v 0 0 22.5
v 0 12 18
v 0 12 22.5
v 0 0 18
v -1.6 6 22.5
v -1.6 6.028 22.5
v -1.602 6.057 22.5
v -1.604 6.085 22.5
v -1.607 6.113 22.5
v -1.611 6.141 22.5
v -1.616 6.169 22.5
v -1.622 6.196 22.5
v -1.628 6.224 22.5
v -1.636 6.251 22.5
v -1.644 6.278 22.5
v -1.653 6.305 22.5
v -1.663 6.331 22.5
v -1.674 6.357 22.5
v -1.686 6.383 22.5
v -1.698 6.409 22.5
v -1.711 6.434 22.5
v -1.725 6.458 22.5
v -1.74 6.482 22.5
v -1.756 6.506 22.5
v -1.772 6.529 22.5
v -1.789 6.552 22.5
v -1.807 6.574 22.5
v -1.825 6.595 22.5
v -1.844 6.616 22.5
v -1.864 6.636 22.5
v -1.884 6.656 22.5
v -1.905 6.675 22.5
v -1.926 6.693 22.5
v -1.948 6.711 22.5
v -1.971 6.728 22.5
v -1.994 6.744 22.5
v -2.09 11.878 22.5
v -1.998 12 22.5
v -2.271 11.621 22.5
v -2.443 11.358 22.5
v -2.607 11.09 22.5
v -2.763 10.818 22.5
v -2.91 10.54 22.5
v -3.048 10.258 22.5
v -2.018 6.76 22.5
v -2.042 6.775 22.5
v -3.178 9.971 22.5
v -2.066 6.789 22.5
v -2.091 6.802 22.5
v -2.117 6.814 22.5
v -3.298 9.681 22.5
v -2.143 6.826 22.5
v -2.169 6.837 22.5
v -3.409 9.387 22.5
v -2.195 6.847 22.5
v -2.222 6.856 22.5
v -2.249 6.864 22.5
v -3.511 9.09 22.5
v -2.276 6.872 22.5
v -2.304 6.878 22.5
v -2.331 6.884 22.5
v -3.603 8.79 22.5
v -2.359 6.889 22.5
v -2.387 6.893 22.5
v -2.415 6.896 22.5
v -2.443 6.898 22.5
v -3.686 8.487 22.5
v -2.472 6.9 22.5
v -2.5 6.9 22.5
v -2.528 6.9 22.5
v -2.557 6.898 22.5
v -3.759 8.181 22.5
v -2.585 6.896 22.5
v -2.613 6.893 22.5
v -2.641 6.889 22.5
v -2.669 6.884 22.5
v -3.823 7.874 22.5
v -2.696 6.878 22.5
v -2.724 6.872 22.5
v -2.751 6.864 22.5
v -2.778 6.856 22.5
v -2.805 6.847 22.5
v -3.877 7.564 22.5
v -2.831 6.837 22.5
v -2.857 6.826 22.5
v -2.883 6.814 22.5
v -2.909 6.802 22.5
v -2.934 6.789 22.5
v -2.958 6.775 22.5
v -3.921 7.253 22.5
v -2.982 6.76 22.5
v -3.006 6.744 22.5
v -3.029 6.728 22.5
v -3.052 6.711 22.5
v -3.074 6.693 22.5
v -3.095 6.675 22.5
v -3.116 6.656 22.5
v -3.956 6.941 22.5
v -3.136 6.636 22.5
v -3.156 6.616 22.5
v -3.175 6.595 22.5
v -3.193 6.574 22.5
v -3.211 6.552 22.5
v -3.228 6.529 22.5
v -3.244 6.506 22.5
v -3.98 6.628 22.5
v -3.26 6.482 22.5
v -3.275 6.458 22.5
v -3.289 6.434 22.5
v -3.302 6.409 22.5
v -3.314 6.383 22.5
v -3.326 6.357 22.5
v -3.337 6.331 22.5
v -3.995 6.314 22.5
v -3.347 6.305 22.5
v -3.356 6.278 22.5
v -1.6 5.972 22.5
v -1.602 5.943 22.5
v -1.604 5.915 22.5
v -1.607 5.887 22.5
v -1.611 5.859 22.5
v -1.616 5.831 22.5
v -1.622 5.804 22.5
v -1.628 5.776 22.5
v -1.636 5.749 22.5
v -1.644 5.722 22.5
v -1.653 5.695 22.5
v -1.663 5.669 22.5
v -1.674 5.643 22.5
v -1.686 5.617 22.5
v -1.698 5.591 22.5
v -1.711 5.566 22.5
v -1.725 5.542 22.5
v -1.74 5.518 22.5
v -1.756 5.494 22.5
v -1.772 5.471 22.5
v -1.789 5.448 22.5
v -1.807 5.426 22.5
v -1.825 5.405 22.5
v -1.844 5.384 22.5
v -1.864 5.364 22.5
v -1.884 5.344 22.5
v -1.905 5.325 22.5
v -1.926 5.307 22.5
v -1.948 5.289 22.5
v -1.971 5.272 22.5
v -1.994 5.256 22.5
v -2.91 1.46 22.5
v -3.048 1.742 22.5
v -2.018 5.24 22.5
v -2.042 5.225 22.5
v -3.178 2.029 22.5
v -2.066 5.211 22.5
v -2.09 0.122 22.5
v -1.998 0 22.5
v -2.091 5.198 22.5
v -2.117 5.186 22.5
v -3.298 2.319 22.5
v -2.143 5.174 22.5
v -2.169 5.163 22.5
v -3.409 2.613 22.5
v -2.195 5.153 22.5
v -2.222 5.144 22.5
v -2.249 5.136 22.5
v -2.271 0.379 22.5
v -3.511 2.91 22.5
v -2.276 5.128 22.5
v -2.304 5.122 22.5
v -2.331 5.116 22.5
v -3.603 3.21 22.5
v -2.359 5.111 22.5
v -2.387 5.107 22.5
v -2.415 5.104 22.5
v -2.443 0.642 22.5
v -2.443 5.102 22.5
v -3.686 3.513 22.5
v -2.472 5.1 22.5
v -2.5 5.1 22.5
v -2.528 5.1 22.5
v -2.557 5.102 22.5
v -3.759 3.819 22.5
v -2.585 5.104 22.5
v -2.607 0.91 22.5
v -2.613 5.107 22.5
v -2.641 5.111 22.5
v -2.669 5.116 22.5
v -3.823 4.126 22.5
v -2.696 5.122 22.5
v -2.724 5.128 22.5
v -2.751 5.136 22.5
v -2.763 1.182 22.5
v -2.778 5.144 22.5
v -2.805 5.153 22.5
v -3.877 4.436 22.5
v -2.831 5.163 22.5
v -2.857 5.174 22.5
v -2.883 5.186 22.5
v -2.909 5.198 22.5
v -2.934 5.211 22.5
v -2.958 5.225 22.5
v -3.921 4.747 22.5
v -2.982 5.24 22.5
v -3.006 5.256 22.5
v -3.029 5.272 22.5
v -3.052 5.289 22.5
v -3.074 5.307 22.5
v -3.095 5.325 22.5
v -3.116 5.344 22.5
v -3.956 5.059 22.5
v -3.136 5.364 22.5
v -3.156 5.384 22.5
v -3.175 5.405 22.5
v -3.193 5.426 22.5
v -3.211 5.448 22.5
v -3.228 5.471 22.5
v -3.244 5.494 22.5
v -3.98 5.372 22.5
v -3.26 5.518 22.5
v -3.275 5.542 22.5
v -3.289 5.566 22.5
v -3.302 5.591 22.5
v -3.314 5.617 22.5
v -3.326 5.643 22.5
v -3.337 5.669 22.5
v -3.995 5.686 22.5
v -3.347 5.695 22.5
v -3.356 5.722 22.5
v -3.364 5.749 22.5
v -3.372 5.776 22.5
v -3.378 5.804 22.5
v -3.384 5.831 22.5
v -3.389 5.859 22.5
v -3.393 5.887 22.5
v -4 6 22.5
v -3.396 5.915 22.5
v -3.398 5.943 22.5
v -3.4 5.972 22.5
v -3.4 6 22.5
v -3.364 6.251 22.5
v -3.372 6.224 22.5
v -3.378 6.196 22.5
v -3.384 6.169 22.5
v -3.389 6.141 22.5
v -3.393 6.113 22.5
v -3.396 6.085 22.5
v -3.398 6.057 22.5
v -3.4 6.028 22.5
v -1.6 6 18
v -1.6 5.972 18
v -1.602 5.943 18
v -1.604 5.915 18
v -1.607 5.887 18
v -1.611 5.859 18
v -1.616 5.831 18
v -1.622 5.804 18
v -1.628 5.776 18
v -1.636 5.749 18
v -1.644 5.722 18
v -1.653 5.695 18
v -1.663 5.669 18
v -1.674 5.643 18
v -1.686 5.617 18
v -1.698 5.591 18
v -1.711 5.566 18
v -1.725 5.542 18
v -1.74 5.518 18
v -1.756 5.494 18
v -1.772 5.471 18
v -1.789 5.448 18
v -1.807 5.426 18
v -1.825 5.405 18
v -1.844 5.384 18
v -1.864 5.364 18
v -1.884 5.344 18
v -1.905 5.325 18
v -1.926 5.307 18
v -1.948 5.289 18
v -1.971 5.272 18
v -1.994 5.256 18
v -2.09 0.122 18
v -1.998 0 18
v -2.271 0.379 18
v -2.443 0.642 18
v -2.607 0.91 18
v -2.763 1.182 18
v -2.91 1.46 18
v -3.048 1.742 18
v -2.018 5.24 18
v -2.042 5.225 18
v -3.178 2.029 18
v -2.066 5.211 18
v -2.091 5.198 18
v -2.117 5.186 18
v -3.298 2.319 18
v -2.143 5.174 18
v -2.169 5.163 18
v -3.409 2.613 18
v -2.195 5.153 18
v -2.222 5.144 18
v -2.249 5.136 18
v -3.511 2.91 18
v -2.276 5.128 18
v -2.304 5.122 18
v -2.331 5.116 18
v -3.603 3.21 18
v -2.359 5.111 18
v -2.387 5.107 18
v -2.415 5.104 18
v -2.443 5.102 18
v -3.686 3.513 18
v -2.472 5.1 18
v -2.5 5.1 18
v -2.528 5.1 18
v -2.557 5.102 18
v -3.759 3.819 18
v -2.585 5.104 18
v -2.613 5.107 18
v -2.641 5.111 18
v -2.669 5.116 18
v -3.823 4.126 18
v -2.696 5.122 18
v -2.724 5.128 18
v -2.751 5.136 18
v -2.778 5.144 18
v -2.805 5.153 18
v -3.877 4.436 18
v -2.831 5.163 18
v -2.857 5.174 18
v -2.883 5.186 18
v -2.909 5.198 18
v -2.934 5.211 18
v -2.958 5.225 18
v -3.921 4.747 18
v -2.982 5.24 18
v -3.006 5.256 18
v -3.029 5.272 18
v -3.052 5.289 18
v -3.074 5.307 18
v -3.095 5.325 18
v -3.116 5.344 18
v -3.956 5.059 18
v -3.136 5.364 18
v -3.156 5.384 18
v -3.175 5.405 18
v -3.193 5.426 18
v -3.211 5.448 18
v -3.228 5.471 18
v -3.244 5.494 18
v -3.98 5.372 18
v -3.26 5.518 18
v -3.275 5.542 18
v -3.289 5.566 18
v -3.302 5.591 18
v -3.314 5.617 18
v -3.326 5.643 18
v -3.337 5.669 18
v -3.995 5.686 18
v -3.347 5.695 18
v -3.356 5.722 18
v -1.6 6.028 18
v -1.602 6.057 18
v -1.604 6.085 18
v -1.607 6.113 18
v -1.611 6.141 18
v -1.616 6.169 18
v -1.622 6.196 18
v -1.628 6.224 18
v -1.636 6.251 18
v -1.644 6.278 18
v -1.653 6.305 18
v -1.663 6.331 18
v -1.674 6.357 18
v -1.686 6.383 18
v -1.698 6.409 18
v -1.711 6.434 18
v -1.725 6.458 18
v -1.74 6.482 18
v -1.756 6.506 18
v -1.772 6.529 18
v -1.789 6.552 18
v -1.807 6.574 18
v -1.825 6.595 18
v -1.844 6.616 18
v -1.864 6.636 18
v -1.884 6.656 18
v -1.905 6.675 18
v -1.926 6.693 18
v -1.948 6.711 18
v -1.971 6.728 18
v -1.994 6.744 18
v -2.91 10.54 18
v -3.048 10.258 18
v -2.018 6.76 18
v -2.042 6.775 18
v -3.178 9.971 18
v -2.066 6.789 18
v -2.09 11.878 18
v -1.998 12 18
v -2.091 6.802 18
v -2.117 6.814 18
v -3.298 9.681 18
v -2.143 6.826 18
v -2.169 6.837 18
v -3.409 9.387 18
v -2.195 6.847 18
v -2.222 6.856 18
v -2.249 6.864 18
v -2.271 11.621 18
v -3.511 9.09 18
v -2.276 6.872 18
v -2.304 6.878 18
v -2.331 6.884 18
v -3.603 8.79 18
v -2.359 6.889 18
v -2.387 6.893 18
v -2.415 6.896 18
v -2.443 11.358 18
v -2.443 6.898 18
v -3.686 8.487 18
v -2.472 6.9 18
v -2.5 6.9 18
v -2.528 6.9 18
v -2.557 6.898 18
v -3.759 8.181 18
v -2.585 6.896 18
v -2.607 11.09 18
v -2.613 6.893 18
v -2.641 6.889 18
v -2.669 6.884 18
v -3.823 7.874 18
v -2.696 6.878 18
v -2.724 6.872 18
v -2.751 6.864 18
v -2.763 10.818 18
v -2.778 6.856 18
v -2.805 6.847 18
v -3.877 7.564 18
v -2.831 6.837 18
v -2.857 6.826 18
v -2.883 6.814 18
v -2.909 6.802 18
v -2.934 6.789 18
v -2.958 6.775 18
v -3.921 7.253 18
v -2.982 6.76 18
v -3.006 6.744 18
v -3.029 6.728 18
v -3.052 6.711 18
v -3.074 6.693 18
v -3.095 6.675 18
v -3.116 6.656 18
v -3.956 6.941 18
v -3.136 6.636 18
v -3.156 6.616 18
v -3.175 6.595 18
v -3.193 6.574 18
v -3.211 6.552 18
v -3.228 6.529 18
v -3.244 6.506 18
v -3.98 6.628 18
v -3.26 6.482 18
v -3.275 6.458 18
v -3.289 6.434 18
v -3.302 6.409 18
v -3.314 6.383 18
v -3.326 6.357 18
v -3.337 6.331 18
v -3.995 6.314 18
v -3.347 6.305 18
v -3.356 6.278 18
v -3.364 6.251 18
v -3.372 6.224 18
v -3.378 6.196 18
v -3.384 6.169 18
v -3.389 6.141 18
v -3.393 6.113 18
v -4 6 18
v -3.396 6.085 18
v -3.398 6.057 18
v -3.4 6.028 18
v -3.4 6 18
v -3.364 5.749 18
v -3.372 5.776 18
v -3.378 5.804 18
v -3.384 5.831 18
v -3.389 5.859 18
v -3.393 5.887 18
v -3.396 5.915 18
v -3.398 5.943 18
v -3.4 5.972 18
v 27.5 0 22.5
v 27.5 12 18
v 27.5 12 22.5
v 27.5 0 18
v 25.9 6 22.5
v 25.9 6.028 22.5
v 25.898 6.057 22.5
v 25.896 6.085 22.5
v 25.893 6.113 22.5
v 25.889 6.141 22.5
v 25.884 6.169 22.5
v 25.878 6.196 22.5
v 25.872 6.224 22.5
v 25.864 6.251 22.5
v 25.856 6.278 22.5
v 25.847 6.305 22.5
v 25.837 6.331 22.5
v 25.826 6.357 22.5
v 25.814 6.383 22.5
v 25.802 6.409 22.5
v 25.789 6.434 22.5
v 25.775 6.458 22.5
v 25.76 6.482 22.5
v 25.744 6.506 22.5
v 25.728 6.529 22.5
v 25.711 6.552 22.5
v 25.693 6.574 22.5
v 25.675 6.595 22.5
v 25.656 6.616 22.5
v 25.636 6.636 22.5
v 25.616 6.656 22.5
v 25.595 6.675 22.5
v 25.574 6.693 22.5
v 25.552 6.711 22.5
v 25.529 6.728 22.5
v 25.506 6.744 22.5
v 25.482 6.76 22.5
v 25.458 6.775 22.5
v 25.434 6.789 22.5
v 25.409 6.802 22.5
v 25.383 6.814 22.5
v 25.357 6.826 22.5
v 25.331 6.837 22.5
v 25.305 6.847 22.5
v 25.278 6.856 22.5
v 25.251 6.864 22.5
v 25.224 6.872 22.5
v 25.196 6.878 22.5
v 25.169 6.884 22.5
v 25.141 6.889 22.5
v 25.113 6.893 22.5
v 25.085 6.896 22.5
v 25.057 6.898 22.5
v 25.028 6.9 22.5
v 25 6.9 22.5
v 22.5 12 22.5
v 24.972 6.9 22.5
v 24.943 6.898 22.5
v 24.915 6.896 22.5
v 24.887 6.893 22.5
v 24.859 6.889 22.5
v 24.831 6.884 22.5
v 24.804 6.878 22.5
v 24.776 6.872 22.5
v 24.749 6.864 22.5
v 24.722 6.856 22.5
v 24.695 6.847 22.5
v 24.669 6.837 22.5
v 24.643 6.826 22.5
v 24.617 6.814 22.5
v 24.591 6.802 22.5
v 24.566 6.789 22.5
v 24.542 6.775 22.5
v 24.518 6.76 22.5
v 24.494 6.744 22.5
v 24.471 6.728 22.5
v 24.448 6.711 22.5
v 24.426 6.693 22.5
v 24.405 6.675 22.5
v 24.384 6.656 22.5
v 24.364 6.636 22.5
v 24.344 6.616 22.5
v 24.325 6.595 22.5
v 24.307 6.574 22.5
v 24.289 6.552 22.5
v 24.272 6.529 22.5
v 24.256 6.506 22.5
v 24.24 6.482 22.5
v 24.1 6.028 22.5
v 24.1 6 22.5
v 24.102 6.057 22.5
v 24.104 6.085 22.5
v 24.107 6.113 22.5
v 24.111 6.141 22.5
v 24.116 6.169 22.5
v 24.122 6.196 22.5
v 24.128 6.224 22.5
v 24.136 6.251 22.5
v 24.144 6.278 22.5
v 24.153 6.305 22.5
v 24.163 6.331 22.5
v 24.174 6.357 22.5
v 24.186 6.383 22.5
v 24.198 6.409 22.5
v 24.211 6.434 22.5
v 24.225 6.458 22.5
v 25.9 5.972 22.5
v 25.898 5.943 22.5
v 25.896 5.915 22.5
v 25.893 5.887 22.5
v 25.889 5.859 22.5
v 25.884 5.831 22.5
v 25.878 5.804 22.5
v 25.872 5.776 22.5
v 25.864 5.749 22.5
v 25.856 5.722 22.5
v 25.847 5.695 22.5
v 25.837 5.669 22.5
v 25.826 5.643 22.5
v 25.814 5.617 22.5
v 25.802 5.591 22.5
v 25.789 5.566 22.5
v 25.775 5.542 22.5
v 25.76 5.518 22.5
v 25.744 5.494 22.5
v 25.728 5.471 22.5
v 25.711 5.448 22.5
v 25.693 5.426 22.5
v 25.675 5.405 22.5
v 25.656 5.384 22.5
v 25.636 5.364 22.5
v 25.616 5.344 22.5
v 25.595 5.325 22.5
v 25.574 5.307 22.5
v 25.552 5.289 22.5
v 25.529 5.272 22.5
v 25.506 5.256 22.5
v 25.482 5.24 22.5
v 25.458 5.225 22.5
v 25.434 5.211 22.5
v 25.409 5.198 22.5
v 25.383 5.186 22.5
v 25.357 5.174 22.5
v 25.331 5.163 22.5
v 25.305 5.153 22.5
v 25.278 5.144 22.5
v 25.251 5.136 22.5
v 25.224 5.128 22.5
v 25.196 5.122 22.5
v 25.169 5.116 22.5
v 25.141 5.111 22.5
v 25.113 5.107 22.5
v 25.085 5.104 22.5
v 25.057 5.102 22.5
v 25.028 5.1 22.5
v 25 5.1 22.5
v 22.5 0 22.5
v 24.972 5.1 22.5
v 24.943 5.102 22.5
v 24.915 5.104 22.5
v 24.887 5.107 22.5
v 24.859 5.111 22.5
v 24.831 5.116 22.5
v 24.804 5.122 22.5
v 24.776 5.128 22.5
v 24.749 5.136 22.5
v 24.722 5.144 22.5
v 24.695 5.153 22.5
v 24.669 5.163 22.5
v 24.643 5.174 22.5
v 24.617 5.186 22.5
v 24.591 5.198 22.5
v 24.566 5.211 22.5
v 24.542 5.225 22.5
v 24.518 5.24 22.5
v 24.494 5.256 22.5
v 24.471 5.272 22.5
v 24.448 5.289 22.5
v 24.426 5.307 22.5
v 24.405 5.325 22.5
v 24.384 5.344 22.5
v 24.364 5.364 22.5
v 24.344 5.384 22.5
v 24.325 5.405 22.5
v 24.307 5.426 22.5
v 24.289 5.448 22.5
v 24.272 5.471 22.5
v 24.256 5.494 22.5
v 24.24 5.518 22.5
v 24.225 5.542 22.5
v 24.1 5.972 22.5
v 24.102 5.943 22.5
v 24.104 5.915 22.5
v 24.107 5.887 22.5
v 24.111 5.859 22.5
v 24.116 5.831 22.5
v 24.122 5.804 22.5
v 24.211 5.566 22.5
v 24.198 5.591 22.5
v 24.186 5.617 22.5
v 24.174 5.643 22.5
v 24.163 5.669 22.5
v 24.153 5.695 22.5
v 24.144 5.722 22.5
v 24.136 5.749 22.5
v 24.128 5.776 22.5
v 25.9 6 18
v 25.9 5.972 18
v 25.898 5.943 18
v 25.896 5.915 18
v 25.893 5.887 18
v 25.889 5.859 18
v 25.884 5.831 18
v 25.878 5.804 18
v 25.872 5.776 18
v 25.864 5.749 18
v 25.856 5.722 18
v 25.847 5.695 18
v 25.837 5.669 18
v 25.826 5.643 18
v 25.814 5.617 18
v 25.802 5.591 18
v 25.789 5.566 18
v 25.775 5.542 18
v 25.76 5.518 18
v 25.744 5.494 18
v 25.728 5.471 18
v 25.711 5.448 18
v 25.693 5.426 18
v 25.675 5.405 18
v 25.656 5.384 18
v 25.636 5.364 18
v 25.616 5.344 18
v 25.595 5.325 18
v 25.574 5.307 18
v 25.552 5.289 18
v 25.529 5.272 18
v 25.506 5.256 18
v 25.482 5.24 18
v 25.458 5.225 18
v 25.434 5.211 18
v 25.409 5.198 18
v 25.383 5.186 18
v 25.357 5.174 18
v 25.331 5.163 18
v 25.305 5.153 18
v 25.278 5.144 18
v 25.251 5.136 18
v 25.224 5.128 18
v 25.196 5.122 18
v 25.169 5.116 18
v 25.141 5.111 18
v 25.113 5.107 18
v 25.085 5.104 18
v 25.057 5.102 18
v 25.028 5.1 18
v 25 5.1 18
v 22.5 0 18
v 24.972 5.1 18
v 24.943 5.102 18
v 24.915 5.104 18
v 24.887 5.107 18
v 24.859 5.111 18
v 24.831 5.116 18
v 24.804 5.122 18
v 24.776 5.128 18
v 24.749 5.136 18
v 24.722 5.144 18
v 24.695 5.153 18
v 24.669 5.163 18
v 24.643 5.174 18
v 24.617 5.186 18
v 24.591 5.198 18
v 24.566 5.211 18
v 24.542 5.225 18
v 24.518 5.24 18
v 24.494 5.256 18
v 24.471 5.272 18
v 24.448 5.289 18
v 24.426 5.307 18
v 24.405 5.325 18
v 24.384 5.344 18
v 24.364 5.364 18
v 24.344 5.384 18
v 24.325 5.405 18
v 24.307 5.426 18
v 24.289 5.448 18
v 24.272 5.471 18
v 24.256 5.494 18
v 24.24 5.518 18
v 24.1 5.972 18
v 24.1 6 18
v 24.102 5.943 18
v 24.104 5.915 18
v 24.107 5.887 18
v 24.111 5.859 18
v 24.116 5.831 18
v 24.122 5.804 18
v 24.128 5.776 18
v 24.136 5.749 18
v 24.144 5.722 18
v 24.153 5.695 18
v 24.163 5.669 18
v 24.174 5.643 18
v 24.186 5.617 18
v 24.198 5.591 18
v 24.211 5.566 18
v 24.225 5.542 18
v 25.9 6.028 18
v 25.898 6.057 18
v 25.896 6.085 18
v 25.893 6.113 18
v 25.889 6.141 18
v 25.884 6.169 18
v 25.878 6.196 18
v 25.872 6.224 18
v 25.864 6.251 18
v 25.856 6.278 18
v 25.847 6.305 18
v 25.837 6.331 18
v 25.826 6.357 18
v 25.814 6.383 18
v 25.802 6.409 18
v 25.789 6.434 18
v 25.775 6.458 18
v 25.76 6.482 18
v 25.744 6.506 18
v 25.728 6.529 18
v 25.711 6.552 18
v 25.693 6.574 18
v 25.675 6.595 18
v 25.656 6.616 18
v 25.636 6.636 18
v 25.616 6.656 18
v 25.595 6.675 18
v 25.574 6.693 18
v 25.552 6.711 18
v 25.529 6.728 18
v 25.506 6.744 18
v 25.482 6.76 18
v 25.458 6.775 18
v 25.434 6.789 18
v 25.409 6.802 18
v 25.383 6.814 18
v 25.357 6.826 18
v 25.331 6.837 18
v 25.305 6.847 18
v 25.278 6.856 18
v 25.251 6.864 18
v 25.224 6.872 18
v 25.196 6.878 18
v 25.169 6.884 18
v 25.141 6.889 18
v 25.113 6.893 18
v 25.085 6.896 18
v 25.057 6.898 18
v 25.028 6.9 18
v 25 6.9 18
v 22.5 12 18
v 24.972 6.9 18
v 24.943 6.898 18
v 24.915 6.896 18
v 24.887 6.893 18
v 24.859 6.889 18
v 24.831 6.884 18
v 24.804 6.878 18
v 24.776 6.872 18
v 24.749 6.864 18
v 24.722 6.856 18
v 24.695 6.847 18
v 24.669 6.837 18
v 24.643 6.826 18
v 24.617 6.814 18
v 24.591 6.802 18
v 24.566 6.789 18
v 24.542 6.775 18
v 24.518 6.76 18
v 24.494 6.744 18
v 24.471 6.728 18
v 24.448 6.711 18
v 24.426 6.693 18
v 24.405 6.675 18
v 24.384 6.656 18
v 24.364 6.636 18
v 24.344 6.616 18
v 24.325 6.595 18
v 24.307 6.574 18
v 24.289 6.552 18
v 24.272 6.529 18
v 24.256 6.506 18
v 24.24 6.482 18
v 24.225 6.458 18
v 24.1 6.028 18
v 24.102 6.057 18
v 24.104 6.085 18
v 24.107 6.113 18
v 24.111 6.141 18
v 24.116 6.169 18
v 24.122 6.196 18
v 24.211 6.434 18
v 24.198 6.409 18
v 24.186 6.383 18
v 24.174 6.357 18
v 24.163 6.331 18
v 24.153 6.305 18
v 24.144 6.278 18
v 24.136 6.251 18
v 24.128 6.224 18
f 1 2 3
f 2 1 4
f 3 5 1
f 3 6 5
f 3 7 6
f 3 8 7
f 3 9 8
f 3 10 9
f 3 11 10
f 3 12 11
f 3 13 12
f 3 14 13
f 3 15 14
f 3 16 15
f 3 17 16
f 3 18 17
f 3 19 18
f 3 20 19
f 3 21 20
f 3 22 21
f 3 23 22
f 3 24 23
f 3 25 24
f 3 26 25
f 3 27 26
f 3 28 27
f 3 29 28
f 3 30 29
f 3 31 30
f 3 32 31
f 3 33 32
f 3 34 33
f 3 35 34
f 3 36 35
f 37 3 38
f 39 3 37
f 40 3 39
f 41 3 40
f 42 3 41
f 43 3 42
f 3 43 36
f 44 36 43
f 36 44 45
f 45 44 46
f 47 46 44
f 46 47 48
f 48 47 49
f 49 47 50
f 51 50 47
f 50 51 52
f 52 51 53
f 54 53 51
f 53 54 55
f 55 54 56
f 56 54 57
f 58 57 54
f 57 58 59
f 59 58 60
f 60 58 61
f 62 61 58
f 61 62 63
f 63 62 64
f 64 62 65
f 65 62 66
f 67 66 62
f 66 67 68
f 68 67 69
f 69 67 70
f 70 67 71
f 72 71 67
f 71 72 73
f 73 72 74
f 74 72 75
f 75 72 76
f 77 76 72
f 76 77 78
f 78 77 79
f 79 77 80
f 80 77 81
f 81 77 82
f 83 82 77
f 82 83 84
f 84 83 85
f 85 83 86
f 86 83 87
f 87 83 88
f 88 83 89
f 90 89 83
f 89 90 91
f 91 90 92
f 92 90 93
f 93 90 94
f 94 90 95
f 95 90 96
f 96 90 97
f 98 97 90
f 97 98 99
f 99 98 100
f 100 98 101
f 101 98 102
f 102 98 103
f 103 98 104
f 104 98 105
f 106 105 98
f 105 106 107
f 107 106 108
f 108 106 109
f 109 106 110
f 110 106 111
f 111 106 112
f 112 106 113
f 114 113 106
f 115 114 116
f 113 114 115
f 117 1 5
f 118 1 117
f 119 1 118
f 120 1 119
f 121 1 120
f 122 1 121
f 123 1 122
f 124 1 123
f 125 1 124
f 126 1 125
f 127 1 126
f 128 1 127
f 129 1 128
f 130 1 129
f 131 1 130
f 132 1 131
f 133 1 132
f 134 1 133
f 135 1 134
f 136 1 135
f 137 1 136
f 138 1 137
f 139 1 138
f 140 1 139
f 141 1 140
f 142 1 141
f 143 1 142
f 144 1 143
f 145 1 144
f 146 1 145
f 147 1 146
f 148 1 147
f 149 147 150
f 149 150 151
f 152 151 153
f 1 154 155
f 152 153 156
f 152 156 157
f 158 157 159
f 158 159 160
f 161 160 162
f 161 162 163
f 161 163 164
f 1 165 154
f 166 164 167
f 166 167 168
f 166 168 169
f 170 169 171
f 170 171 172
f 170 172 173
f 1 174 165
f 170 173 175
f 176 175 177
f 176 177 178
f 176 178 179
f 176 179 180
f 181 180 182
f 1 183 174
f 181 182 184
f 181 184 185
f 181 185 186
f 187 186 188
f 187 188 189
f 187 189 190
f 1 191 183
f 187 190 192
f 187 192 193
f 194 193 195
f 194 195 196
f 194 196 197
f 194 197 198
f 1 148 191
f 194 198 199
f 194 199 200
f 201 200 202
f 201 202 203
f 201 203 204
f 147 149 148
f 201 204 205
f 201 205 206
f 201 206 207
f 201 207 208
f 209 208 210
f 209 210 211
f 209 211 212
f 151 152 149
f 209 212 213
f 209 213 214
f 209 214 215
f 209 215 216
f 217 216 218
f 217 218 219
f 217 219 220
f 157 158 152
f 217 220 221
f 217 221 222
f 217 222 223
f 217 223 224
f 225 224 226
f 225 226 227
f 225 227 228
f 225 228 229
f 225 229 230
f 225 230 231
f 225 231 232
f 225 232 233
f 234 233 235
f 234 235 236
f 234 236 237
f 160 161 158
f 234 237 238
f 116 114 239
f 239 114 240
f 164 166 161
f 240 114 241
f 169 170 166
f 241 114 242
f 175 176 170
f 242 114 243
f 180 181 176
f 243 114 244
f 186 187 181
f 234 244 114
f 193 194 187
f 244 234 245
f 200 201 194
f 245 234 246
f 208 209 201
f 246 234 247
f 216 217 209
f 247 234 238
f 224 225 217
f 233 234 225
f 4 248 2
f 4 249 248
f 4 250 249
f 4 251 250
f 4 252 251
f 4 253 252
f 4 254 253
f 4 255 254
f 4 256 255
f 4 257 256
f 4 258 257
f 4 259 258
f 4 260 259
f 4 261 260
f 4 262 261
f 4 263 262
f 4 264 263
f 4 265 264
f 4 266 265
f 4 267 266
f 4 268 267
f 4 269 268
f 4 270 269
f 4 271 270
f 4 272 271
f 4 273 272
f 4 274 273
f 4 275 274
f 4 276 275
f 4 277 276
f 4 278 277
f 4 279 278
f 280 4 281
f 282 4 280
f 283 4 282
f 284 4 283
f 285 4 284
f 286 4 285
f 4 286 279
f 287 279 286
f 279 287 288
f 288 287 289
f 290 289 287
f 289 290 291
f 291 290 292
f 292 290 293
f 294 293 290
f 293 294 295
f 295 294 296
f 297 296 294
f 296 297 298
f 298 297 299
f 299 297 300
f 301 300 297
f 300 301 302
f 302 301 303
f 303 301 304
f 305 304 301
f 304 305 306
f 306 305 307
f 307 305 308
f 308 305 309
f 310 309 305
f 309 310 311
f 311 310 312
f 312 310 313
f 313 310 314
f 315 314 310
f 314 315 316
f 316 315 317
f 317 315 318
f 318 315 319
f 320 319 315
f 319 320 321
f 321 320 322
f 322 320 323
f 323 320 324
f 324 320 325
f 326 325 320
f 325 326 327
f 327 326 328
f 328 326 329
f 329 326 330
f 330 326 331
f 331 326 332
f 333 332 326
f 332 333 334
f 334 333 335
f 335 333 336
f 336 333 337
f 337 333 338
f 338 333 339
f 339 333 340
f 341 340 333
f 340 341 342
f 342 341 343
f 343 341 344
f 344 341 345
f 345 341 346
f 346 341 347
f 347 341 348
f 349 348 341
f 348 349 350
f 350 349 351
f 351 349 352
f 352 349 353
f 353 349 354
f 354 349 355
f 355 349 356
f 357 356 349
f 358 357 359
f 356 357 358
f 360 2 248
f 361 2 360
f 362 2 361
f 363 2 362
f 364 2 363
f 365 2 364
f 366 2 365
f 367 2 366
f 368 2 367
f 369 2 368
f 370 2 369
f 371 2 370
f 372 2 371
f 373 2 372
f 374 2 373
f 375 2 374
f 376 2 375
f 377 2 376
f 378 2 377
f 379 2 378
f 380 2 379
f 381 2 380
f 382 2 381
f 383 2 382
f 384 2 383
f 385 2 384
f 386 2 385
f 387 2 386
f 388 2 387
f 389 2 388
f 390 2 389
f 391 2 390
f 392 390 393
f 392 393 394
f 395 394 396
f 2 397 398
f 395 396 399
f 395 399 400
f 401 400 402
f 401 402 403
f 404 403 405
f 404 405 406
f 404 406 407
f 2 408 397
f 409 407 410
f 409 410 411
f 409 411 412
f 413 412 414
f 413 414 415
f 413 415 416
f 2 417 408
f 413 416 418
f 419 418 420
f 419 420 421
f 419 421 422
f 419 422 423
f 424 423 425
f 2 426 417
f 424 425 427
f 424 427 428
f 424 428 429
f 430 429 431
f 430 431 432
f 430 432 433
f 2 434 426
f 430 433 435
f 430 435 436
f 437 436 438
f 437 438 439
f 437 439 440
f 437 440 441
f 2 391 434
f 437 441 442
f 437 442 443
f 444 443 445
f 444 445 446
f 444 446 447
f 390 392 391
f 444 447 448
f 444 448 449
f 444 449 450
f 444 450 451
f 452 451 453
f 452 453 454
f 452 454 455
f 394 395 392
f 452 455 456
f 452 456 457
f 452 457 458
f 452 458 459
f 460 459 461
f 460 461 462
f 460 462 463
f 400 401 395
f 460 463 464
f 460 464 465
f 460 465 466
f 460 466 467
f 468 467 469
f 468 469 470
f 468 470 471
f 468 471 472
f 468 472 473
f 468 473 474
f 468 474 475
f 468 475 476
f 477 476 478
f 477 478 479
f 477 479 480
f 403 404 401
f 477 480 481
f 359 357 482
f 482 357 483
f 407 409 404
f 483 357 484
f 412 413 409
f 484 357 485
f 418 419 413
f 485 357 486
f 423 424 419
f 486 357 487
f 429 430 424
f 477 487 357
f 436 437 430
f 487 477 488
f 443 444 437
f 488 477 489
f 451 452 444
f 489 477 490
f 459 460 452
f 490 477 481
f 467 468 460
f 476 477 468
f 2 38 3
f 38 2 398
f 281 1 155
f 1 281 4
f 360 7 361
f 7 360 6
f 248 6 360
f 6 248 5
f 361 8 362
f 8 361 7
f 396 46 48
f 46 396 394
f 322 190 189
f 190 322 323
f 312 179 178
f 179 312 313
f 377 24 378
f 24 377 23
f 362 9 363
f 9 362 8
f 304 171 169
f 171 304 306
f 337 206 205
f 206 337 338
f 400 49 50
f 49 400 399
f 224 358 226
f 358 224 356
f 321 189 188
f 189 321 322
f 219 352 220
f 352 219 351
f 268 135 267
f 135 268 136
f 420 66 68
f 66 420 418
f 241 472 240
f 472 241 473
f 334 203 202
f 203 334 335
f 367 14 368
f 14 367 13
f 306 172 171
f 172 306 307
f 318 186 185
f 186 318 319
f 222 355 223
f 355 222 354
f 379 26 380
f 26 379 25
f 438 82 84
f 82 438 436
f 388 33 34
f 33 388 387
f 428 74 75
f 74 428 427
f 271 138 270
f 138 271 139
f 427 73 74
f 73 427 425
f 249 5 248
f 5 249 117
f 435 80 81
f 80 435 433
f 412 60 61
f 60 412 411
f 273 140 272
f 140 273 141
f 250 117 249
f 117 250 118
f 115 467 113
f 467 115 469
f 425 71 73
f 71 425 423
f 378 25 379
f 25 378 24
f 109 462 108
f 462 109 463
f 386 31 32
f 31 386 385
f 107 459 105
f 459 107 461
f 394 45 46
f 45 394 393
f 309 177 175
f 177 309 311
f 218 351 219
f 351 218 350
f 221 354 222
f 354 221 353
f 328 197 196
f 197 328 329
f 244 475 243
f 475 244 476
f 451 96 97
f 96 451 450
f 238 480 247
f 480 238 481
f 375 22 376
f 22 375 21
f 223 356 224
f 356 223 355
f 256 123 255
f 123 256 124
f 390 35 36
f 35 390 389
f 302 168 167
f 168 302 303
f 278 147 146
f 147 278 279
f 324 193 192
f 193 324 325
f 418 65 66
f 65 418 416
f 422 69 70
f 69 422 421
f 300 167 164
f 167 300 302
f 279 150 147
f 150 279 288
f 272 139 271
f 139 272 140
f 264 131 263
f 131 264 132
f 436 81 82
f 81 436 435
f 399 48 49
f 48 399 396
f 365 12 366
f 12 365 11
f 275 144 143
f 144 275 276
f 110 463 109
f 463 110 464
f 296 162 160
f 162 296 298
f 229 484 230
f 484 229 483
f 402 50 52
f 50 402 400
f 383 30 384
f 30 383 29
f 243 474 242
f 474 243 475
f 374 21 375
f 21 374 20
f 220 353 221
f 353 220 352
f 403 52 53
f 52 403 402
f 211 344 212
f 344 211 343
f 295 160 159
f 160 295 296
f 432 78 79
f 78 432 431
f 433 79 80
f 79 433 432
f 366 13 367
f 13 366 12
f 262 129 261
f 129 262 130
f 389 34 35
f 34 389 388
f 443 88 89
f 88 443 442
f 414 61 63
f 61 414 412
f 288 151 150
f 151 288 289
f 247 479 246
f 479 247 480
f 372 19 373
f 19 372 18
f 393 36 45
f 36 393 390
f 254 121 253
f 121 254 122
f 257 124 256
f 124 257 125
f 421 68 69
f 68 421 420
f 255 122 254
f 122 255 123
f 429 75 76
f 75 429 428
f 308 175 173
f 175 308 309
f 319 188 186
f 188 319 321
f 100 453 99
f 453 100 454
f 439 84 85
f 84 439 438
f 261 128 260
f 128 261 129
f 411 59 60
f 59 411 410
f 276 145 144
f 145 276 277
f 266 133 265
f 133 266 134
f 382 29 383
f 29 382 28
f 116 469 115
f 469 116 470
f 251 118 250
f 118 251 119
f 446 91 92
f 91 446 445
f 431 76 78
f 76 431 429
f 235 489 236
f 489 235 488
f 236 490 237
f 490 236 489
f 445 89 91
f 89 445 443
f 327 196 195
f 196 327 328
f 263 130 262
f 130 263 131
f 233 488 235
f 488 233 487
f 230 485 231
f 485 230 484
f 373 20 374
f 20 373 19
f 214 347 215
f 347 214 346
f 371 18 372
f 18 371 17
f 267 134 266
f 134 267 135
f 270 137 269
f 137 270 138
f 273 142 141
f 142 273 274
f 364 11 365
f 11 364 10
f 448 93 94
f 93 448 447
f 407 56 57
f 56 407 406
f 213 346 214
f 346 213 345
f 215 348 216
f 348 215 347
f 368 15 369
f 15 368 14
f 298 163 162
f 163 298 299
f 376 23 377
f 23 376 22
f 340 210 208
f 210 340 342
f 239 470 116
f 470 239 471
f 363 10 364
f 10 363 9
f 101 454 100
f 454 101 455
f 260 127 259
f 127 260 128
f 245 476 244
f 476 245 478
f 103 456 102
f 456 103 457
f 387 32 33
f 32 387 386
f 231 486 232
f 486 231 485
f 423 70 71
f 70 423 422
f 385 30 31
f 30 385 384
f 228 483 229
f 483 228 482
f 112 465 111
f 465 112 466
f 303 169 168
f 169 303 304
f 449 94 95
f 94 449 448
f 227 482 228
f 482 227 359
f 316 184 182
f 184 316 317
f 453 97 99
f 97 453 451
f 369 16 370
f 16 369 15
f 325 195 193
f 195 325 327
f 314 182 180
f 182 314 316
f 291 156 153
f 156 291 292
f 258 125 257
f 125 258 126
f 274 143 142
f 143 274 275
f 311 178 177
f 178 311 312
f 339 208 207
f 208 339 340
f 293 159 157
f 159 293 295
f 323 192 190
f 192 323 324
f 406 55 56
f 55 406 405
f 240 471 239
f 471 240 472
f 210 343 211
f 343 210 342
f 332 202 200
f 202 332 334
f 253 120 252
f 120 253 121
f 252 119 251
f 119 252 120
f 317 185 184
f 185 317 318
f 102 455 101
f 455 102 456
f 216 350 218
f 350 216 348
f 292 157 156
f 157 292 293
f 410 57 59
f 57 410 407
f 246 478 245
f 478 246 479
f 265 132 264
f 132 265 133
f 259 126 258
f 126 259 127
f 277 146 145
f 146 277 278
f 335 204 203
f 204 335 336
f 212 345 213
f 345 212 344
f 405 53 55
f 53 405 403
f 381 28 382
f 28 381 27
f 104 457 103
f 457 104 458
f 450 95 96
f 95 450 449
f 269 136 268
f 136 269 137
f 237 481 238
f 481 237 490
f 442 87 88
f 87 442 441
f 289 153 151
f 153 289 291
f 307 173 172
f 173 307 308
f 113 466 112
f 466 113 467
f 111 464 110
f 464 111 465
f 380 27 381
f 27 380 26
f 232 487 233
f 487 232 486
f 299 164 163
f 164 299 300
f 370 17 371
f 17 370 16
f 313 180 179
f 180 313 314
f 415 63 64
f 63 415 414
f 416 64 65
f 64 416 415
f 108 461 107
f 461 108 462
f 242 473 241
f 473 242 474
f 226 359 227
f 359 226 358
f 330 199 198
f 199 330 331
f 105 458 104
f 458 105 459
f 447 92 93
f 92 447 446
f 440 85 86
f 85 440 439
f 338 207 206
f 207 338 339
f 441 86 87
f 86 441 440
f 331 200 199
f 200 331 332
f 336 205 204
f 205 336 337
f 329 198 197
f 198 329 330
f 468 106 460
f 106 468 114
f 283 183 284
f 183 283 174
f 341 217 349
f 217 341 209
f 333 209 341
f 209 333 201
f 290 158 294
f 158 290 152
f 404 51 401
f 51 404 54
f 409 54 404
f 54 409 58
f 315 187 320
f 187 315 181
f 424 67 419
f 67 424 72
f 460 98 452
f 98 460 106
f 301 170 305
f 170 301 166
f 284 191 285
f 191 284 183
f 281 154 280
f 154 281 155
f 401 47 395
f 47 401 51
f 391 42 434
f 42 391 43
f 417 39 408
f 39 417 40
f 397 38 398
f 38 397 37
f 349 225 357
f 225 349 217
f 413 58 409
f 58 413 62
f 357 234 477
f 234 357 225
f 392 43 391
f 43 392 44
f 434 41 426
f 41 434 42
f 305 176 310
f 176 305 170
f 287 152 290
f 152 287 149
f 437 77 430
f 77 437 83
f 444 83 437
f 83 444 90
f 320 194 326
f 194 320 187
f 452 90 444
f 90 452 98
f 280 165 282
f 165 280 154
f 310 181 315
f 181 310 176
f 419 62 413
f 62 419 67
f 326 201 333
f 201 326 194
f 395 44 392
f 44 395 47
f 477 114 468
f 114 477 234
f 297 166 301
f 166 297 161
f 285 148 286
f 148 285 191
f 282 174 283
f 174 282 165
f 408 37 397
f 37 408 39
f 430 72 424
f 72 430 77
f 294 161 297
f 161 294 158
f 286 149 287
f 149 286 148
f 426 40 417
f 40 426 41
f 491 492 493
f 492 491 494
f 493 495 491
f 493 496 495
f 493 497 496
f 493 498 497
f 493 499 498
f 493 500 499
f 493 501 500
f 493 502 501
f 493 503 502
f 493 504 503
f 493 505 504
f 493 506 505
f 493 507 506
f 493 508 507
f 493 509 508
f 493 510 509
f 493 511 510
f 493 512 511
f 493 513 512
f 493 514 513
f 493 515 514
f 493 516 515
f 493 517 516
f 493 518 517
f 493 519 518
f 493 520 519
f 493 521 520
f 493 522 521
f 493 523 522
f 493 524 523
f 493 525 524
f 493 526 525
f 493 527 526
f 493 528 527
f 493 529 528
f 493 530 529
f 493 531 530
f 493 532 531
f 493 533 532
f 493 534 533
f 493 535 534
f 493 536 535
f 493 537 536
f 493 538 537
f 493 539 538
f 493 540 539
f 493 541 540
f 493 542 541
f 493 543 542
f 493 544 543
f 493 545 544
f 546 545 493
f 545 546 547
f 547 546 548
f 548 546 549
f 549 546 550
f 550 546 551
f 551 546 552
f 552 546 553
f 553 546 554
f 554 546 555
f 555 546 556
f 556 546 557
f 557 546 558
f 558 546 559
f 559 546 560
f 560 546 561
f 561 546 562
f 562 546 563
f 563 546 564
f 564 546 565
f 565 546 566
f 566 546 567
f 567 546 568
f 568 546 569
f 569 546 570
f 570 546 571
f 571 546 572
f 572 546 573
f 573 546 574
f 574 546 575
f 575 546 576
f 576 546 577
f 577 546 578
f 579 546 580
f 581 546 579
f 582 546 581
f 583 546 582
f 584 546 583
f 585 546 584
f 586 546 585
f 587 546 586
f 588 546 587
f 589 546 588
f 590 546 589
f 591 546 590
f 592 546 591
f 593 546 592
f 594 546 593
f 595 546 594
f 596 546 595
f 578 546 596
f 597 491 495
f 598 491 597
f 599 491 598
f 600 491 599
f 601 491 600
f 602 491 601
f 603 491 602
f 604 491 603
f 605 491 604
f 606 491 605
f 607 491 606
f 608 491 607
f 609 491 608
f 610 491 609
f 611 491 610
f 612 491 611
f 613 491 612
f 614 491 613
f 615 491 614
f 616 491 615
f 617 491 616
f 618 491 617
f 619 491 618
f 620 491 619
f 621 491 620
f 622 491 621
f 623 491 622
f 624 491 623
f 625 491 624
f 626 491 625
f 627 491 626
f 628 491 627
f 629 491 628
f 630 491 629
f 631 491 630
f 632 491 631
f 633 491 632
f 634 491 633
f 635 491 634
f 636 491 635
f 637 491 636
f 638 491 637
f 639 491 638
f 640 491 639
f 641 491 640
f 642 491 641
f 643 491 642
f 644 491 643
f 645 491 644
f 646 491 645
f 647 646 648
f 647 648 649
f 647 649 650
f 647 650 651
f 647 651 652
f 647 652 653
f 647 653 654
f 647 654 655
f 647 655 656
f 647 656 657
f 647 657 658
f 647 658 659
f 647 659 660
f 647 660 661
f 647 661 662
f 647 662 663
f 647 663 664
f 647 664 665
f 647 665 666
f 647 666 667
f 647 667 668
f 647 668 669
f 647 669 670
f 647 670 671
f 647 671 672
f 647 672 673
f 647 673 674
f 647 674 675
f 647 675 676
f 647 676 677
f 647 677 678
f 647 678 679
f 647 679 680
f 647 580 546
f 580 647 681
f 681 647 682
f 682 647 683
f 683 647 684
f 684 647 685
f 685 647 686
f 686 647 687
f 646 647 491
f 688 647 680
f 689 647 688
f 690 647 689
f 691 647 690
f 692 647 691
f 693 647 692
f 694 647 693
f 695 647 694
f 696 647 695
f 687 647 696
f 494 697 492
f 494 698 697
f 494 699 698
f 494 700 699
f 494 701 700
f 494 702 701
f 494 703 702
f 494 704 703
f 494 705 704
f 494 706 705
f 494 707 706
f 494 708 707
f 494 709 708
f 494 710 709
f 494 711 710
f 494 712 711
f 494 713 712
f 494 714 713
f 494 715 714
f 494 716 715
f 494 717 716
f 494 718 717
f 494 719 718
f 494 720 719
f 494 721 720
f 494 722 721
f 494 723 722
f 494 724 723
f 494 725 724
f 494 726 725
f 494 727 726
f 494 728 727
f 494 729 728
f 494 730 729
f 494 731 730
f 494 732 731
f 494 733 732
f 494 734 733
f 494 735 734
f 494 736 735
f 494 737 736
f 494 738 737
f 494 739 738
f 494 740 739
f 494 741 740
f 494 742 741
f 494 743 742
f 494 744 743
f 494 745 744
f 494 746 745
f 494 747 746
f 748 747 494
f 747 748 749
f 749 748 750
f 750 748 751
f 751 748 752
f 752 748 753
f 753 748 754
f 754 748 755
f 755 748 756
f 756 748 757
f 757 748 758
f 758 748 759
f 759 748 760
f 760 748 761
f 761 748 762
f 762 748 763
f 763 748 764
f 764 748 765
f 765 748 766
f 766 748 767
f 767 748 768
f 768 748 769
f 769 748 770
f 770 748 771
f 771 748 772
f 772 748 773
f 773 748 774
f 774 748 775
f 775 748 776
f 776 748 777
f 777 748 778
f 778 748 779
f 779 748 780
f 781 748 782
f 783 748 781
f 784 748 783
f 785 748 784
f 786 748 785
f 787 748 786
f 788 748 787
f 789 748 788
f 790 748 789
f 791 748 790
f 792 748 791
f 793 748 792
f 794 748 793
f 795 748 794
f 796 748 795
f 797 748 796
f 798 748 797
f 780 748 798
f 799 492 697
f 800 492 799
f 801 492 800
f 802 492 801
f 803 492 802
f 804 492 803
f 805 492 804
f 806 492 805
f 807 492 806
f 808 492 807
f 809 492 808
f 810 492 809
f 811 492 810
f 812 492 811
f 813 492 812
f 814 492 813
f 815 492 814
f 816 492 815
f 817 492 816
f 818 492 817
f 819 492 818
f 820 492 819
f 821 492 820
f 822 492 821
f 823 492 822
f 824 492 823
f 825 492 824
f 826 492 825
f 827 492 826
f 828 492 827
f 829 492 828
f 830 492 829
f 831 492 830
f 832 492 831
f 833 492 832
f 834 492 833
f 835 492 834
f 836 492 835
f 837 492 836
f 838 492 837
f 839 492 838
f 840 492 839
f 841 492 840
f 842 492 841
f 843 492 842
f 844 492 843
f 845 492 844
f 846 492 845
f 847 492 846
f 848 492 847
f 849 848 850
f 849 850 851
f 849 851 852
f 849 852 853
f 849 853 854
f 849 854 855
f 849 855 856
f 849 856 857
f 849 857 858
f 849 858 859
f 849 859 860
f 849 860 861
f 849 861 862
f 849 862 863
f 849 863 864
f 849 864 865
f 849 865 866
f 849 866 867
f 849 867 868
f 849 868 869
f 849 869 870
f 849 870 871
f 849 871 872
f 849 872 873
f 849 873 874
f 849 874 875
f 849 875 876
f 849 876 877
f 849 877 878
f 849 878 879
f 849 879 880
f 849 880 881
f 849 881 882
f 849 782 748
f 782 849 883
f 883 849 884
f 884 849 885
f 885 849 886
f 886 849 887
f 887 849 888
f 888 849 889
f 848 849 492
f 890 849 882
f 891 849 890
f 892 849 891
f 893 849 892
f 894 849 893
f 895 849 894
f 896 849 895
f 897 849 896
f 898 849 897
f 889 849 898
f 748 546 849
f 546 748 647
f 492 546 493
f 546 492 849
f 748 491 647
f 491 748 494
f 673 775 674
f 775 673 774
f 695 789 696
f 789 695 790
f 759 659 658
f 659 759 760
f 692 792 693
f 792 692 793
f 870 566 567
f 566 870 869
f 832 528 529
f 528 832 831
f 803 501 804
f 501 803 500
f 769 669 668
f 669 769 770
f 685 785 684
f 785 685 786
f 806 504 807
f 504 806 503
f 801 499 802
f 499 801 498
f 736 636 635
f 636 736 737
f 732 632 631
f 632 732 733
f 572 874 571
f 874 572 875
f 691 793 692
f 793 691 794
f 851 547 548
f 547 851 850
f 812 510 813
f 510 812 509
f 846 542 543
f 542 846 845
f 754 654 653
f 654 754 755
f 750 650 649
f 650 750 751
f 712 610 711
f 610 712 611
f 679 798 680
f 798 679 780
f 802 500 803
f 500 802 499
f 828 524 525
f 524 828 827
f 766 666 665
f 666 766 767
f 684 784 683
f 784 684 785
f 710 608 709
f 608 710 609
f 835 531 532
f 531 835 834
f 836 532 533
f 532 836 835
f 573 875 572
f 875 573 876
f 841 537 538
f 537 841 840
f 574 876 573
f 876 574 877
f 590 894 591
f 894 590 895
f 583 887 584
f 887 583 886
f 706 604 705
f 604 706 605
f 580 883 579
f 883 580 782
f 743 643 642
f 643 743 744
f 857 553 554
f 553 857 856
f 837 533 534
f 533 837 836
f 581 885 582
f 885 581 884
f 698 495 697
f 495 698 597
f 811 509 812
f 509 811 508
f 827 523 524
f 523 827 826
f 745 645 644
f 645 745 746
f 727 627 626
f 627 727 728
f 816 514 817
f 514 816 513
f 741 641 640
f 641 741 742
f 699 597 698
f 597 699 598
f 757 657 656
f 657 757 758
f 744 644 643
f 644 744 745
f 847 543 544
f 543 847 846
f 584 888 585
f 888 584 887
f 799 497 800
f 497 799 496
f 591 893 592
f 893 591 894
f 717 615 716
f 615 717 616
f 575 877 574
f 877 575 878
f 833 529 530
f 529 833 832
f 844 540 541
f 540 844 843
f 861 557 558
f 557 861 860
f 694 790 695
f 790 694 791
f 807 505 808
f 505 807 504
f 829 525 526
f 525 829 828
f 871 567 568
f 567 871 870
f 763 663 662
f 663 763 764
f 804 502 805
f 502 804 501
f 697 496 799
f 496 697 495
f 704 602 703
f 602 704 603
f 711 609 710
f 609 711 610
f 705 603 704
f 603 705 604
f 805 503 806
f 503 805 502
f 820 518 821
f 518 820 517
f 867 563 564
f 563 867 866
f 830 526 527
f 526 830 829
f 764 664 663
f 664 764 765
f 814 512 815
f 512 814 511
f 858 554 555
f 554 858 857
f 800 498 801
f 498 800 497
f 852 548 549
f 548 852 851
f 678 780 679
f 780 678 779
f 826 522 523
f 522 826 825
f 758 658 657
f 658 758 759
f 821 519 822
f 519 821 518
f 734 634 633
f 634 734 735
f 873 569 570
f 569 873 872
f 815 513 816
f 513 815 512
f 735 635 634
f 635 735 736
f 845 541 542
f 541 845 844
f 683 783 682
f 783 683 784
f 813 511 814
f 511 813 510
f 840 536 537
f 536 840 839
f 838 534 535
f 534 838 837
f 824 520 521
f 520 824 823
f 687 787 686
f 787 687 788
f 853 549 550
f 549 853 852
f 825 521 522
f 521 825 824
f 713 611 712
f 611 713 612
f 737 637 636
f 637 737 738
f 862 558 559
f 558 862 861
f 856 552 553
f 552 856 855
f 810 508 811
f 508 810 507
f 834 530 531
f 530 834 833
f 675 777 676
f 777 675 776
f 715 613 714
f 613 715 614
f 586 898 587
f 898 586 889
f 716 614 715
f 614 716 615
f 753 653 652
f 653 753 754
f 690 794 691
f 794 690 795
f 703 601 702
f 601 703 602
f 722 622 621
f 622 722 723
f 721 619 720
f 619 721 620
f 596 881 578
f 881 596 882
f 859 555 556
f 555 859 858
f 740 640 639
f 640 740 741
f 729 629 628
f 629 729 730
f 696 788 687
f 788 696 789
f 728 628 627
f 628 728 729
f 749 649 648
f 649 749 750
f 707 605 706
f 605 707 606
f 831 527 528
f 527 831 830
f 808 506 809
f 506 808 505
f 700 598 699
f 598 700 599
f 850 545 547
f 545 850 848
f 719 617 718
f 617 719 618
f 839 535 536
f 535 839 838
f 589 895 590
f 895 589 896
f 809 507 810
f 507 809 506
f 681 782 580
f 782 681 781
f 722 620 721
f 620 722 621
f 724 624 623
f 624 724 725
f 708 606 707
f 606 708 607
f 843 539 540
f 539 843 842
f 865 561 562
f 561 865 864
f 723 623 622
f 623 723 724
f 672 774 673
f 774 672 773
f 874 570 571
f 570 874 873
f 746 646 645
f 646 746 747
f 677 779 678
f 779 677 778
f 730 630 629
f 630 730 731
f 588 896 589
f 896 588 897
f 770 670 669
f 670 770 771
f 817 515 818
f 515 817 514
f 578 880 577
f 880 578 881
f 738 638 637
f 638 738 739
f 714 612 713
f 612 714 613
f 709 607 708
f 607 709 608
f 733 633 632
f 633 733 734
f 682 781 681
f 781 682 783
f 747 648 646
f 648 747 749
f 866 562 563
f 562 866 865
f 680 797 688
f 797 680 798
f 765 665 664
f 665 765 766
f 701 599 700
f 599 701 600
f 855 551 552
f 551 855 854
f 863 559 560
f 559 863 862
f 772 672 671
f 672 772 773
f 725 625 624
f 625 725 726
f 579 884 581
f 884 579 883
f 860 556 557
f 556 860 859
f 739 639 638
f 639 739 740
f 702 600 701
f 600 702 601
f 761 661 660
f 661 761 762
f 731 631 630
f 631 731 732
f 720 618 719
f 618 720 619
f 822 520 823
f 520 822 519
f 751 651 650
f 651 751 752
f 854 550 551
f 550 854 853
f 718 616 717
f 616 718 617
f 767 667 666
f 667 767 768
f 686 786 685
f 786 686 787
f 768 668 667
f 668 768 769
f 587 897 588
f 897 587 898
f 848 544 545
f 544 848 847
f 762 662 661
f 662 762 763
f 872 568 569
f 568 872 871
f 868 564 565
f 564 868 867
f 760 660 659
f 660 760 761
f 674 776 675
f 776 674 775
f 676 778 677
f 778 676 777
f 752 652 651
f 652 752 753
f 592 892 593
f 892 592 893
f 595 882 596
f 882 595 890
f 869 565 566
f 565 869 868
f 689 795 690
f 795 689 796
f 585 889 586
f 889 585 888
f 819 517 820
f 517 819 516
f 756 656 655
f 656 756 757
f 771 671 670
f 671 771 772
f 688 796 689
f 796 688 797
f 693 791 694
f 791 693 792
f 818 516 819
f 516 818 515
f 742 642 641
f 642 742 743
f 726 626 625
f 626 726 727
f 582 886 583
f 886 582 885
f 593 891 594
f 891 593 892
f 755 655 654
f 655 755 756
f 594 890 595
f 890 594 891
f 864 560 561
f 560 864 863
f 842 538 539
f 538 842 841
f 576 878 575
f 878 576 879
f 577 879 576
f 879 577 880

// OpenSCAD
//Autora: Giovana Tripoloni Tangerino
//2020
$fn=200;


//SG90_motor();
//SG90_motorBarra();
//SG90_motorBarraD();
SG90_motorApoio();

//translate([6,6,27]) rotate([0,0,180]) SG90_motorBarra();	
//translate([6,6,27]) rotate([0,0,180]) SG90_motorBarraD();	

//---------------------------------------------------------
//SG90_motor();
module SG90_motor(){
		union(){
			translate([0,0,0]) rotate([0,0,0]) cube([22.5,12,16]);
			translate([-5,0,16]) rotate([0,0,0]) cube([32.5,12,2]);
			translate([0,0,18]) rotate([0,0,0]) cube([22.5,12,4.5]);
            translate([6,6,22.5]) rotate([0,0,0]) cylinder(4.5,6,6);
            translate([12,6,22.5]) rotate([0,0,0]) cylinder(4.5,2.75,2.75);
            translate([6.5,3.25,22.5]) rotate([0,0,0]) cube([5.5,5.5,4.5]);			
            translate([6,6,27]) rotate([0,0,0]) cylinder(2.5,2.25,2.25);
//			translate([6,6,27]) rotate([0,0,180]) SG90_motorBarra();	
   }
}
//---------------------------------------------------------
//SG90_motorBarra();
module SG90_motorBarra(){
//	difference(){
	//	translate([-6,-5,0]) rotate([0,0,0]) cube([25,10,3]);
		union(){
      	translate([0,0,0]) rotate([0,0,0]) cylinder(4.5,3.75,3.75);
       	translate([1.75,0,0]) rotate([0,0,0]) cylinder(4.5,2.75,2.75);
      	translate([14.5,0,0]) rotate([0,0,0]) cylinder(4.5,1.75,1.75);
			linear_extrude(height=4.5) polygon([[0, -3.65], [14.7, -1.75], [14.7, 1.75], [0, 3.65]]);		
		}
//   }
}

//---------------------------------------------------------
//SG90_motorBarraD();
module SG90_motorBarraD(){
//	difference(){//teste
//	translate([-18,-5,0]) rotate([0,0,0]) cube([36,10,2]);//teste
		union(){
      	translate([0,0,0]) cylinder(5,3.75,3.75);
      	rotate([0,0,0])   translate([14.4,0,0]) cylinder(5,2.2,2.2);
      	rotate([0,0,180]) translate([14.4,0,0]) cylinder(5,2.2,2.2);
			rotate([0,0,0])   linear_extrude(height=5) polygon([[0, -3.6], [14.7, -2.2], [14.7, 2.2], [0, 3.6]]);		
			rotate([0,0,180]) linear_extrude(height=5) polygon([[0, -3.6], [14.7, -2.2], [14.7, 2.2], [0, 3.6]]);		
//		}//teste
}
}
//---------------------------------------------------------
//SG90_motorApoio();
module SG90_motorApoio(){
	difference(){
		difference(){
     		translate([-5,0,18]) rotate([0,0,0]) cube([5,12,4.5]);
     		translate([-2.5,6,18]) rotate([0,0,0]) cylinder(4.5,.9,.9);
		}
		difference(){		        
     		translate([-5,0,18]) rotate([0,0,0]) cube([5,12,4.5]);
			translate([6,6,18]) rotate([0,0,0]) cylinder(5,10,10);
	 	}	
	}
	difference(){
      	translate([22.5,0,18]) rotate([0,0,0]) cube([5,12,4.5]);
      	translate([25,6,18]) rotate([0,0,0]) cylinder(4.5,.9,.9);
	}
}
